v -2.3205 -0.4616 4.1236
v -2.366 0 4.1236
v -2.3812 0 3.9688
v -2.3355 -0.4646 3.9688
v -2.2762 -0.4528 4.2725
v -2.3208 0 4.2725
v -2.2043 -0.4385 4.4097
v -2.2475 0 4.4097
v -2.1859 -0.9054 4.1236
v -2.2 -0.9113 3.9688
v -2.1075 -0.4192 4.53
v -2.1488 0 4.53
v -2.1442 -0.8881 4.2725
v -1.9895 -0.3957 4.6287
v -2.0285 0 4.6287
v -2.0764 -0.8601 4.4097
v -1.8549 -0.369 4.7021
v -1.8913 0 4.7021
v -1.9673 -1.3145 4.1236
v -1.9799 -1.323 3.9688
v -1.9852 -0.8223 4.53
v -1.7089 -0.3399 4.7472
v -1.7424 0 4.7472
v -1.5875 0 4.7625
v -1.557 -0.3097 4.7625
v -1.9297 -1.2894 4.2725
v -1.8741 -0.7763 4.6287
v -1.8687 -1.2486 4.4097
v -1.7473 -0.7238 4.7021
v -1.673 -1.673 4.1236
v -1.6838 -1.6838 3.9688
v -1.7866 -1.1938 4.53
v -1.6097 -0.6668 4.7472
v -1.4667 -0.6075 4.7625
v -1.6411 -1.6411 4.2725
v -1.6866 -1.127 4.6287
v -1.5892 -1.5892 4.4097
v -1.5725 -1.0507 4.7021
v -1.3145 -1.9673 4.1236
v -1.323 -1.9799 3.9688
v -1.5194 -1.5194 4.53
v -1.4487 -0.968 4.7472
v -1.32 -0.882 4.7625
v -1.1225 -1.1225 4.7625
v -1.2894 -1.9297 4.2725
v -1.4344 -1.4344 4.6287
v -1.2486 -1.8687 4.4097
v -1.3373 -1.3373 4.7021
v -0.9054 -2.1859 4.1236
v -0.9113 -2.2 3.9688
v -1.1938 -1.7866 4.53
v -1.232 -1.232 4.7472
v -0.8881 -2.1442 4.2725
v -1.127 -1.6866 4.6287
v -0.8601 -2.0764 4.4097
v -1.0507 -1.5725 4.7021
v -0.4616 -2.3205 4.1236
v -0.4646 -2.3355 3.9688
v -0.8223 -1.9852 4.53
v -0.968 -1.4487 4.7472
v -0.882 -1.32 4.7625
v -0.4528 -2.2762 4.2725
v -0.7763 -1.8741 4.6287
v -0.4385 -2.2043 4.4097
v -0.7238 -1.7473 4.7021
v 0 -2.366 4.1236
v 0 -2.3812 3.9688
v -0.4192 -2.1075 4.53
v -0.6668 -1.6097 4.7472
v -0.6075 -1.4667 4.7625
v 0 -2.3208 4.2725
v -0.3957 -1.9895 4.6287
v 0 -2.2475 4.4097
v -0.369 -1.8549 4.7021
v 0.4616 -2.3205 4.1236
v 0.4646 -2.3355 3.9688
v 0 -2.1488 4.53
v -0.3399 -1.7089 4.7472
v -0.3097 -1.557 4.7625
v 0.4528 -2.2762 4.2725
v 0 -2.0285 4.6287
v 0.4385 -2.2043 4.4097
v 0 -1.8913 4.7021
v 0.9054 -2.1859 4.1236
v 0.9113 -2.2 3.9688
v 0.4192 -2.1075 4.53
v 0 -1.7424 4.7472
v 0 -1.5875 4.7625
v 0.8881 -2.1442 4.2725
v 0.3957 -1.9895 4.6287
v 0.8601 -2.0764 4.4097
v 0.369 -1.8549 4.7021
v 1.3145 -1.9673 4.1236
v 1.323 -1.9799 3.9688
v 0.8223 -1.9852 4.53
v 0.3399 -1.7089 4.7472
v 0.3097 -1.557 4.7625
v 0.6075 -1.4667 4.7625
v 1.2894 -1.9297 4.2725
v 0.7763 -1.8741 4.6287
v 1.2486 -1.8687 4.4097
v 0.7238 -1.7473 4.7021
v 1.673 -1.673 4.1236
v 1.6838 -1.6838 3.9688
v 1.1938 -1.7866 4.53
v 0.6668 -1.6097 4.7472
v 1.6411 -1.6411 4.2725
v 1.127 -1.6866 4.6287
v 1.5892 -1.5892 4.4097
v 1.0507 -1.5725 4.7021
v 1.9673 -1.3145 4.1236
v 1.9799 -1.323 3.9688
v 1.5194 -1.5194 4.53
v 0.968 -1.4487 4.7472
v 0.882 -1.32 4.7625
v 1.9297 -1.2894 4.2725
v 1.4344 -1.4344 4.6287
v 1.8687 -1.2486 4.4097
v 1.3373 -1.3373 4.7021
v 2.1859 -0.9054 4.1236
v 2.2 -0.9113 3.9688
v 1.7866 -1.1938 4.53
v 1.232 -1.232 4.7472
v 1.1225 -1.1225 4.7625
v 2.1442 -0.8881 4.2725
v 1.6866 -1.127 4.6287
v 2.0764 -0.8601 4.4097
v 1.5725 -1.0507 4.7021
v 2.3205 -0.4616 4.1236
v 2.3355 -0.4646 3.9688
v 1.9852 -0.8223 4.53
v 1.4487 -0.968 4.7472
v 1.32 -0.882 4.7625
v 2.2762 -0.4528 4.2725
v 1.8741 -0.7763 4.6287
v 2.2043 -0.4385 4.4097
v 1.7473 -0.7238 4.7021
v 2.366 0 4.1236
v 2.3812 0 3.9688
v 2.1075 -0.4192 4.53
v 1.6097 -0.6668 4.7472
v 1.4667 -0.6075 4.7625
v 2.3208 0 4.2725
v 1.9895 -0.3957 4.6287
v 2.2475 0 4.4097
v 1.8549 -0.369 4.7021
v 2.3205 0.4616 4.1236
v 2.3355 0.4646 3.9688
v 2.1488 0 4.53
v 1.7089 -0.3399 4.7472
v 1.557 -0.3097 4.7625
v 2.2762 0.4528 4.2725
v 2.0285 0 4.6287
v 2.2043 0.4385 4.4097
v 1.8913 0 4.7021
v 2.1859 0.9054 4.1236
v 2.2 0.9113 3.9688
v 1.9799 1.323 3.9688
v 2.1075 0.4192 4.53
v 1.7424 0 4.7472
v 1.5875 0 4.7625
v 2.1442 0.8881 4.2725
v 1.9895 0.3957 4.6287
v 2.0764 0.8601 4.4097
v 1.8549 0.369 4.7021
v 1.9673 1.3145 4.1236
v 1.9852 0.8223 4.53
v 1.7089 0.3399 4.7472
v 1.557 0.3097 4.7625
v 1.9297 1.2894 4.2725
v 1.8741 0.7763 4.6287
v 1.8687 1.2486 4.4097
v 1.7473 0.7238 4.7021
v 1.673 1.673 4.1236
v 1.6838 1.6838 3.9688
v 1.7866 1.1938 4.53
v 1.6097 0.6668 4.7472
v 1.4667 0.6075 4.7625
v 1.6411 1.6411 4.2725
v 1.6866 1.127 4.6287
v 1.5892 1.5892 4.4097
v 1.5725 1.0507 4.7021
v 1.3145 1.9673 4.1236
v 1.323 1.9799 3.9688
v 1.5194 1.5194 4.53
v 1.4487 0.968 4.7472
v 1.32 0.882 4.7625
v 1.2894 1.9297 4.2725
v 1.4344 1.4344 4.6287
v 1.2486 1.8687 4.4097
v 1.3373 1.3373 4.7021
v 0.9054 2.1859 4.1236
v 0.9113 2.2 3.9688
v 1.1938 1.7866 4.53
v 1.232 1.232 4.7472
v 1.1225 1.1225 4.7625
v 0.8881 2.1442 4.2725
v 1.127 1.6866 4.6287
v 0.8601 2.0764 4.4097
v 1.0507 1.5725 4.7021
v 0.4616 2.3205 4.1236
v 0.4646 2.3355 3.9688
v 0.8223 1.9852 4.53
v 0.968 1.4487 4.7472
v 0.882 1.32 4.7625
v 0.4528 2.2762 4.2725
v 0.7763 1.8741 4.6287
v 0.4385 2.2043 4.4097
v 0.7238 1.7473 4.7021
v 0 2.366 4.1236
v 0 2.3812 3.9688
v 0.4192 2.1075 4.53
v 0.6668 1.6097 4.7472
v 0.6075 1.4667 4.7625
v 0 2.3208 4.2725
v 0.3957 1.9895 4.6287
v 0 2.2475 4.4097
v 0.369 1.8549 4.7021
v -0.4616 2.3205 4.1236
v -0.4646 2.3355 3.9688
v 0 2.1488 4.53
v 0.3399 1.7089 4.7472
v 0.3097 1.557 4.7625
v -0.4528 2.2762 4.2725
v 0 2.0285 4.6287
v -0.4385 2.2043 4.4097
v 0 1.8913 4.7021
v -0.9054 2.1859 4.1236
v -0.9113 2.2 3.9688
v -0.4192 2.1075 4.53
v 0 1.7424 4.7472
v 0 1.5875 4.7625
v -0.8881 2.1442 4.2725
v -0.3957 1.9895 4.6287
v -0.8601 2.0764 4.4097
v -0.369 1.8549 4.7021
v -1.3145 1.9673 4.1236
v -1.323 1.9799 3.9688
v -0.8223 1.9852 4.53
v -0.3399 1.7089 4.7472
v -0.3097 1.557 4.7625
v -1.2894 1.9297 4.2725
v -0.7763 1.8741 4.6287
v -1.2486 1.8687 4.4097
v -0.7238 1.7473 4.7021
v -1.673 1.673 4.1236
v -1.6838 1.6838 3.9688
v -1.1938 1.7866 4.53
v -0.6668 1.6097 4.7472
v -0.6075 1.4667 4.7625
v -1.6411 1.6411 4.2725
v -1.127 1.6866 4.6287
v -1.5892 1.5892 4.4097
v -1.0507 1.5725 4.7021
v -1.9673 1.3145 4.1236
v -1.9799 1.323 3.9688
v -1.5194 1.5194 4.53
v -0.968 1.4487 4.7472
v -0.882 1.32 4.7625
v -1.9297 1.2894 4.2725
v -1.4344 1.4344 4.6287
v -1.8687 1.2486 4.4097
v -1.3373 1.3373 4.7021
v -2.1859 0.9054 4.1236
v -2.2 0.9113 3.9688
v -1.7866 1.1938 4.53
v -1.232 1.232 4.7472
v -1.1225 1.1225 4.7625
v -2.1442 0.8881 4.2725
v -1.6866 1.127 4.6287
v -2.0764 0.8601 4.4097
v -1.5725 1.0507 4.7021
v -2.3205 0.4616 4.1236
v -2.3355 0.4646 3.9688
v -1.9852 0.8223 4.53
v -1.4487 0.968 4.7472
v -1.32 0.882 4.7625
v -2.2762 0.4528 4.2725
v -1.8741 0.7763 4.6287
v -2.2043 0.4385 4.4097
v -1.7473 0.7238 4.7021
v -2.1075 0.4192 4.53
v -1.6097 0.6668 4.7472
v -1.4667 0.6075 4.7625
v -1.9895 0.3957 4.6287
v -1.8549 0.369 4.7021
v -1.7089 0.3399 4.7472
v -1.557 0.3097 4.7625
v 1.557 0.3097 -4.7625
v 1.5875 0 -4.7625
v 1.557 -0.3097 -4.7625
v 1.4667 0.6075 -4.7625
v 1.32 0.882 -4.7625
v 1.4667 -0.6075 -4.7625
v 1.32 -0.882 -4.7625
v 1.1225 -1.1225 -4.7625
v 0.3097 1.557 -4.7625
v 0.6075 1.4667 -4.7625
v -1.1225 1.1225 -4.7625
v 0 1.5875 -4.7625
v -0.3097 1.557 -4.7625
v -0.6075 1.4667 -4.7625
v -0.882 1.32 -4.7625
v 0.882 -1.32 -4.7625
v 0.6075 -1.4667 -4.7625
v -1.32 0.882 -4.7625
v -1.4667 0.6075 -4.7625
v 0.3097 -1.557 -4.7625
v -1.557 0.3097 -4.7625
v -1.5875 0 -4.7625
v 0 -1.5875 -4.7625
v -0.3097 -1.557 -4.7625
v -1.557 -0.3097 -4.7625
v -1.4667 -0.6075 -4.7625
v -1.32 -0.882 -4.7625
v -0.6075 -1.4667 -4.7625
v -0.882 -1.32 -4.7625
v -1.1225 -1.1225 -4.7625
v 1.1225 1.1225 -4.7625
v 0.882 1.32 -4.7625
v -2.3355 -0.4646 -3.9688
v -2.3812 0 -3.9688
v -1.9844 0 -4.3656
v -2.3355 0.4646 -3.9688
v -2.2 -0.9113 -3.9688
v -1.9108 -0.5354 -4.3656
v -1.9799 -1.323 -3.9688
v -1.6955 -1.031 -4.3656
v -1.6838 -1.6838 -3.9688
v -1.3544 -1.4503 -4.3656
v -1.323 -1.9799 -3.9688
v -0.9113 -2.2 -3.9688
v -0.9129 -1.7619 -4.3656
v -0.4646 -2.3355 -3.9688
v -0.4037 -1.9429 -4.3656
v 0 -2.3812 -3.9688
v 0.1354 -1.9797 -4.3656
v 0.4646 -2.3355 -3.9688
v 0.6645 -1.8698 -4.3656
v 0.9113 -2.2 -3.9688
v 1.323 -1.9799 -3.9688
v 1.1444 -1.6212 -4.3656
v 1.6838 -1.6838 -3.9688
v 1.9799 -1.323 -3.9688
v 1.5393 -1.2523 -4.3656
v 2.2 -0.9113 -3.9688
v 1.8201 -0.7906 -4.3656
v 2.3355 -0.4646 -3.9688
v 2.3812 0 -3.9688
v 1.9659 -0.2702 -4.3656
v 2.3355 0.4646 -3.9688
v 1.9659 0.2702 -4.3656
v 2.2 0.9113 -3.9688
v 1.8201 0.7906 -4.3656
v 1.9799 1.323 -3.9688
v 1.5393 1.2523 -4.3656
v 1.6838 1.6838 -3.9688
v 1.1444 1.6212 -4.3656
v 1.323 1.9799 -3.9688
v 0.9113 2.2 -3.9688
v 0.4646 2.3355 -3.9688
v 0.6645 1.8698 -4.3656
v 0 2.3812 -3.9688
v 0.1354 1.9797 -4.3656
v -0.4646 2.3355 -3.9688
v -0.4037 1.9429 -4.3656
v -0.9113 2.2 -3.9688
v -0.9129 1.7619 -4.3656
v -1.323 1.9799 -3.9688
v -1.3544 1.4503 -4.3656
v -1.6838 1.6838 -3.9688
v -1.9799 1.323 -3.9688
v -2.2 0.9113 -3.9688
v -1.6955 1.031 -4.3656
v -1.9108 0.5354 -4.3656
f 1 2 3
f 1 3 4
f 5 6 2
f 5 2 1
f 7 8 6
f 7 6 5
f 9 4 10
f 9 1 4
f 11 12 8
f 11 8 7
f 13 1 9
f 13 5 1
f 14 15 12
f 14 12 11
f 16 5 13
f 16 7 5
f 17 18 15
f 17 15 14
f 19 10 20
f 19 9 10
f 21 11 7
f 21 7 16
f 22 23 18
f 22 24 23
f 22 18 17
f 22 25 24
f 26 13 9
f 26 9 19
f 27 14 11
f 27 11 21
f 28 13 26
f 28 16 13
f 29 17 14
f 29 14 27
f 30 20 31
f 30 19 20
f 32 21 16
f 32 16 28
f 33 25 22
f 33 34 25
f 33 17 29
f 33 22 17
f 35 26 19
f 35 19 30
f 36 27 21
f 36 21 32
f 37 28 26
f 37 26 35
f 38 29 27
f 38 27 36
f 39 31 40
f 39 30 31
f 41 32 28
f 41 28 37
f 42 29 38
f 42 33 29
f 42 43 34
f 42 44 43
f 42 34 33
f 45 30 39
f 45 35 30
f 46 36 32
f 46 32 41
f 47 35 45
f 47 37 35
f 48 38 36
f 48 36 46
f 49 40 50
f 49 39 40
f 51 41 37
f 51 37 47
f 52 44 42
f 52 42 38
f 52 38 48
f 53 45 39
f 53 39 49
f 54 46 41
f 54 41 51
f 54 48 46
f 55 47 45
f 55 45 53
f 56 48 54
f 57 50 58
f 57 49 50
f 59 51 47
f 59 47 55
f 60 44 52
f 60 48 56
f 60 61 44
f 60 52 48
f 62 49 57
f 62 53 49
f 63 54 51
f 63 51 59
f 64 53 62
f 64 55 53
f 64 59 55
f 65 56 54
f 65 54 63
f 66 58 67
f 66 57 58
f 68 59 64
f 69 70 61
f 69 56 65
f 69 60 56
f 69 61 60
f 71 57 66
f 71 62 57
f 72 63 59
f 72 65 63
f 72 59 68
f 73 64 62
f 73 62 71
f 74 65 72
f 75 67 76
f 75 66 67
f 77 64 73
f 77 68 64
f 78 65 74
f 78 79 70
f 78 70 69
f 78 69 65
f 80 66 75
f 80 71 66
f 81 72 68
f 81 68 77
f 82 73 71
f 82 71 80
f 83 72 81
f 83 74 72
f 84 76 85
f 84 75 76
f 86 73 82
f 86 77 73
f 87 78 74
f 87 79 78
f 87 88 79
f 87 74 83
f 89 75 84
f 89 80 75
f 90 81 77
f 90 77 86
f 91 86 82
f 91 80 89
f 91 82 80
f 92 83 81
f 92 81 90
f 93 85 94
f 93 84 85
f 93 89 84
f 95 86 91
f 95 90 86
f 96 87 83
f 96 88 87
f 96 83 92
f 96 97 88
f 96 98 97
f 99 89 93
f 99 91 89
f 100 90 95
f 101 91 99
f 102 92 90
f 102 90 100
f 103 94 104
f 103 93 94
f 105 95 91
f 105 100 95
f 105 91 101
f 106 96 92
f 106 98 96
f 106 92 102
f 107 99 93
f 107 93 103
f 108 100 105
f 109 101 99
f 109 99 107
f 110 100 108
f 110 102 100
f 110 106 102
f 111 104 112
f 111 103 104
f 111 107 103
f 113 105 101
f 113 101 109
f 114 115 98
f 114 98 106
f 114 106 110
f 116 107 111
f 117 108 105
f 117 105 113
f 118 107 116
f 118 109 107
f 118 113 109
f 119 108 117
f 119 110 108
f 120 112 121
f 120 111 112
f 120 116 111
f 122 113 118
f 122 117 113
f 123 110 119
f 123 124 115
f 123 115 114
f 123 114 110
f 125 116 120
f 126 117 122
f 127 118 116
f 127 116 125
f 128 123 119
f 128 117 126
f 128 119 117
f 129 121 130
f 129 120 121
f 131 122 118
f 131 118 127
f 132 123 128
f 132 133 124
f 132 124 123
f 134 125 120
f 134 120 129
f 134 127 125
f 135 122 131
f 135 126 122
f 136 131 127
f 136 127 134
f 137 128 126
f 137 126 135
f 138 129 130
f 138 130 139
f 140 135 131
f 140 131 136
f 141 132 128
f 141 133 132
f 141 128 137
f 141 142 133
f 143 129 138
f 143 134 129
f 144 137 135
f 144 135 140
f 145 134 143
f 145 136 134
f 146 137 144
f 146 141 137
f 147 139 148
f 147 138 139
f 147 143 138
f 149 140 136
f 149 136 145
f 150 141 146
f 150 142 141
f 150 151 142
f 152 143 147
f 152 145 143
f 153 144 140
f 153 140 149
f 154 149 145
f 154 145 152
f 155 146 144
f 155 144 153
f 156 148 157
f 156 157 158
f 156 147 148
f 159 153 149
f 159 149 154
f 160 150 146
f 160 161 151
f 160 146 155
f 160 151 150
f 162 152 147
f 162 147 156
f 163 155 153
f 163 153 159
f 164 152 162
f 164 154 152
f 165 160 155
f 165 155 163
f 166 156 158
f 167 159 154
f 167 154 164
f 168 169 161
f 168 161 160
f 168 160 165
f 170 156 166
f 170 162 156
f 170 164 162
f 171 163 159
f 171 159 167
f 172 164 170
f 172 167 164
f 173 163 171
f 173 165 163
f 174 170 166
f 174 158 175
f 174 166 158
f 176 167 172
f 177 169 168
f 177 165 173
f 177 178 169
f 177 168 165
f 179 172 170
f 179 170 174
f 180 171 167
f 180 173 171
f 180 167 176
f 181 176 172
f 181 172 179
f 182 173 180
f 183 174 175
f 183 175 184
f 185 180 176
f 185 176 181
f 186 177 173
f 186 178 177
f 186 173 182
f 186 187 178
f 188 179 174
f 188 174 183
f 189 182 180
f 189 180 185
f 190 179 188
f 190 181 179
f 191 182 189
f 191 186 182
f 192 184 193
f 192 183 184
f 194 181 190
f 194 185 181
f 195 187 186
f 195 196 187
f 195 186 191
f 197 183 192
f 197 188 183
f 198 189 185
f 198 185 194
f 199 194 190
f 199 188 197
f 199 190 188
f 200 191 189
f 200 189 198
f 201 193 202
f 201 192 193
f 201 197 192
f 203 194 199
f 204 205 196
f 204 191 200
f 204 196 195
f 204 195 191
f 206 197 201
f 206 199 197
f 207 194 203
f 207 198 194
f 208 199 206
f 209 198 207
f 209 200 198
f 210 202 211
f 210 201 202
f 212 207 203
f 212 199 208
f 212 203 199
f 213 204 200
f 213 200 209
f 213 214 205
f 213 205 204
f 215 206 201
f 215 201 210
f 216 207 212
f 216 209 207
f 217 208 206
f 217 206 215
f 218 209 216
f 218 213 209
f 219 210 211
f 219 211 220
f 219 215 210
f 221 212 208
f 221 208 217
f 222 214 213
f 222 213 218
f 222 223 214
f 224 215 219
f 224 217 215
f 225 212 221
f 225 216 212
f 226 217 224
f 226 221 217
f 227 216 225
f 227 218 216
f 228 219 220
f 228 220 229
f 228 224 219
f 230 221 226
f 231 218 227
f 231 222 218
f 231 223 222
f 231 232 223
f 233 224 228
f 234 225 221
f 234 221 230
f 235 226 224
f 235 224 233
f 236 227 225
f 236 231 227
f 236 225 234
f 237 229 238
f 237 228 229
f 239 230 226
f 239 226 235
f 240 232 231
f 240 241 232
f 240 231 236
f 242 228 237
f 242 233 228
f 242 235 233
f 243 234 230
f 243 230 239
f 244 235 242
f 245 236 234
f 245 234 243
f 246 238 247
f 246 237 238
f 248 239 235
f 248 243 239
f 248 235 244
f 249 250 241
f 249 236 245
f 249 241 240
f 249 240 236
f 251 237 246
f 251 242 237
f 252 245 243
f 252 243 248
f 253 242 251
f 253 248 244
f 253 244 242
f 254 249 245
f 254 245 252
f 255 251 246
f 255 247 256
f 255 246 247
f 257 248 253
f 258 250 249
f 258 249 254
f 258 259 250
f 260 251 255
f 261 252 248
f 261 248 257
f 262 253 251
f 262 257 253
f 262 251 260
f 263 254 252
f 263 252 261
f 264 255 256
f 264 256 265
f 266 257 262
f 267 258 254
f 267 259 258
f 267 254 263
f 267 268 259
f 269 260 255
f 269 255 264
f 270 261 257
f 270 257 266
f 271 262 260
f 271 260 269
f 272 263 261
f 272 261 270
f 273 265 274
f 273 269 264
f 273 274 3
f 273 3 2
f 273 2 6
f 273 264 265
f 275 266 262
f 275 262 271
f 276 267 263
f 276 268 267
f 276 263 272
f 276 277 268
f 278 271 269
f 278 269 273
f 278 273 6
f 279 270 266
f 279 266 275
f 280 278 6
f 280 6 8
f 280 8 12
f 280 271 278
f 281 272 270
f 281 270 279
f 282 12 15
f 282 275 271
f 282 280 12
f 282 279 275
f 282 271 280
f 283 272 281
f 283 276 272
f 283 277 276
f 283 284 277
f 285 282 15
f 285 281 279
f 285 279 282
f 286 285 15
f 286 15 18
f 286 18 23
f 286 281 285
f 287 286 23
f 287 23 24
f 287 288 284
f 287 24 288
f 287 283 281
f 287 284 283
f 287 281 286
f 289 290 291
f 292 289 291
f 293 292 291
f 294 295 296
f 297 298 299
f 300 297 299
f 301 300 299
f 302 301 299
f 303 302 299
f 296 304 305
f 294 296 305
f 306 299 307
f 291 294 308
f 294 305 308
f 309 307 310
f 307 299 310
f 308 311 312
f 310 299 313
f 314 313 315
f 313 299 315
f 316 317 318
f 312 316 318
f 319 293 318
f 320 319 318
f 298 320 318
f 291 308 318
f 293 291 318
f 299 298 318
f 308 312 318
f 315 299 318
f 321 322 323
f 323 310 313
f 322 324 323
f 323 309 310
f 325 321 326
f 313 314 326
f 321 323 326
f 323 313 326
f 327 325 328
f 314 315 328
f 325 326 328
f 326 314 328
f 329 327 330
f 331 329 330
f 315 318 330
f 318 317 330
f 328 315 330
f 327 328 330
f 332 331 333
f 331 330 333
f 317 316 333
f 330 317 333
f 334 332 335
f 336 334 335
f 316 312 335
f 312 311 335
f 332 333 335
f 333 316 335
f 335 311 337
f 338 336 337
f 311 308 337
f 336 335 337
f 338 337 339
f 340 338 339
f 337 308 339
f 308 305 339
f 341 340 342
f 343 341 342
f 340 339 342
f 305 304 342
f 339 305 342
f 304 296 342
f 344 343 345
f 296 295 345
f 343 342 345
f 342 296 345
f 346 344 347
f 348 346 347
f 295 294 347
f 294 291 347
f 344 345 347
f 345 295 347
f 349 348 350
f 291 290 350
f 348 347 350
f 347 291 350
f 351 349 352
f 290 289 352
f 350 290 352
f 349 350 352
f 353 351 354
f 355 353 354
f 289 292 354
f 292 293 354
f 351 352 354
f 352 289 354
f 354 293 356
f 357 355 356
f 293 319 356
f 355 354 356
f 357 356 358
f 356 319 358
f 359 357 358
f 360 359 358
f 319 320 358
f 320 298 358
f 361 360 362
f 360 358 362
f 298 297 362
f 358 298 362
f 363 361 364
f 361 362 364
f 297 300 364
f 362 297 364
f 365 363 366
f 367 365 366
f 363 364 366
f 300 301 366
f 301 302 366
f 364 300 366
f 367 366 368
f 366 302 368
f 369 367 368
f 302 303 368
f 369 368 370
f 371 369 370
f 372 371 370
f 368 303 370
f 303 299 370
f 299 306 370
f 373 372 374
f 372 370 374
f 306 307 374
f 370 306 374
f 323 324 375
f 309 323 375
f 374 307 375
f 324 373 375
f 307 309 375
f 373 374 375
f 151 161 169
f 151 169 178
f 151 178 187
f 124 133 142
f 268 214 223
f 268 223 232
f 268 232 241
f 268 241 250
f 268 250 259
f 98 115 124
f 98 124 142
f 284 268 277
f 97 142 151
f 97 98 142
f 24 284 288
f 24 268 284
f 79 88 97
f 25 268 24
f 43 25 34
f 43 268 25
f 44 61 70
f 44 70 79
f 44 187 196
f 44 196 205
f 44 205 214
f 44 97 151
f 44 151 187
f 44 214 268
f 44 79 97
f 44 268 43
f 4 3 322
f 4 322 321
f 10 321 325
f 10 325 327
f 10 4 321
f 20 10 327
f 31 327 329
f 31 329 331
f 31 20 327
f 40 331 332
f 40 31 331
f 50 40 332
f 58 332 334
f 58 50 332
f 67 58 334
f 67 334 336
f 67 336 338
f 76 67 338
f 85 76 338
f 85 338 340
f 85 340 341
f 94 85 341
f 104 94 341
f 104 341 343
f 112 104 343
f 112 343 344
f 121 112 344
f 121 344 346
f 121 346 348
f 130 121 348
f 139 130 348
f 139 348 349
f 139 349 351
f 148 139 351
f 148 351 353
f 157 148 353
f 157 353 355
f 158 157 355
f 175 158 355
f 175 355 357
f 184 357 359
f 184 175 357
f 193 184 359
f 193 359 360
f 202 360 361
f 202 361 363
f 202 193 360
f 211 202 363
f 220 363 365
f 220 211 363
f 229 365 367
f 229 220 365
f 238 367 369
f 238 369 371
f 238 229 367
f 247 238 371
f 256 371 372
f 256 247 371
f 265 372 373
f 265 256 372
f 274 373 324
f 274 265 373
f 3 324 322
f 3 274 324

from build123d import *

# Parameters (mm, degrees)
SKETCH1_R      = 2.38125
EXTRUDE1_DEPTH = 4.7625
FILLET1_R      = 0.79375
CHAMFER1_SIZE  = 0.79375


with BuildPart() as part:
    # Sketch1 → Extrude1 (new, symmetric)
    with BuildSketch(Plane.XY):
        with Locations(Location((0, 0, 0), (0, 0, 180))):
            Circle(SKETCH1_R)
    extrude(amount=EXTRUDE1_DEPTH, both=True)

    # Fillet1
    fillet1_edges = [part.edges().sort_by_distance(p)[0] for p in [
        (2.38125, 0, 4.7625),
    ]]
    fillet(fillet1_edges, radius=FILLET1_R)

    # Chamfer1
    chamfer1_edges = [part.edges().sort_by_distance(p)[0] for p in [
        (2.38125, 0, -4.7625),
    ]]
    chamfer(chamfer1_edges, length=CHAMFER1_SIZE)


solid = part.part
